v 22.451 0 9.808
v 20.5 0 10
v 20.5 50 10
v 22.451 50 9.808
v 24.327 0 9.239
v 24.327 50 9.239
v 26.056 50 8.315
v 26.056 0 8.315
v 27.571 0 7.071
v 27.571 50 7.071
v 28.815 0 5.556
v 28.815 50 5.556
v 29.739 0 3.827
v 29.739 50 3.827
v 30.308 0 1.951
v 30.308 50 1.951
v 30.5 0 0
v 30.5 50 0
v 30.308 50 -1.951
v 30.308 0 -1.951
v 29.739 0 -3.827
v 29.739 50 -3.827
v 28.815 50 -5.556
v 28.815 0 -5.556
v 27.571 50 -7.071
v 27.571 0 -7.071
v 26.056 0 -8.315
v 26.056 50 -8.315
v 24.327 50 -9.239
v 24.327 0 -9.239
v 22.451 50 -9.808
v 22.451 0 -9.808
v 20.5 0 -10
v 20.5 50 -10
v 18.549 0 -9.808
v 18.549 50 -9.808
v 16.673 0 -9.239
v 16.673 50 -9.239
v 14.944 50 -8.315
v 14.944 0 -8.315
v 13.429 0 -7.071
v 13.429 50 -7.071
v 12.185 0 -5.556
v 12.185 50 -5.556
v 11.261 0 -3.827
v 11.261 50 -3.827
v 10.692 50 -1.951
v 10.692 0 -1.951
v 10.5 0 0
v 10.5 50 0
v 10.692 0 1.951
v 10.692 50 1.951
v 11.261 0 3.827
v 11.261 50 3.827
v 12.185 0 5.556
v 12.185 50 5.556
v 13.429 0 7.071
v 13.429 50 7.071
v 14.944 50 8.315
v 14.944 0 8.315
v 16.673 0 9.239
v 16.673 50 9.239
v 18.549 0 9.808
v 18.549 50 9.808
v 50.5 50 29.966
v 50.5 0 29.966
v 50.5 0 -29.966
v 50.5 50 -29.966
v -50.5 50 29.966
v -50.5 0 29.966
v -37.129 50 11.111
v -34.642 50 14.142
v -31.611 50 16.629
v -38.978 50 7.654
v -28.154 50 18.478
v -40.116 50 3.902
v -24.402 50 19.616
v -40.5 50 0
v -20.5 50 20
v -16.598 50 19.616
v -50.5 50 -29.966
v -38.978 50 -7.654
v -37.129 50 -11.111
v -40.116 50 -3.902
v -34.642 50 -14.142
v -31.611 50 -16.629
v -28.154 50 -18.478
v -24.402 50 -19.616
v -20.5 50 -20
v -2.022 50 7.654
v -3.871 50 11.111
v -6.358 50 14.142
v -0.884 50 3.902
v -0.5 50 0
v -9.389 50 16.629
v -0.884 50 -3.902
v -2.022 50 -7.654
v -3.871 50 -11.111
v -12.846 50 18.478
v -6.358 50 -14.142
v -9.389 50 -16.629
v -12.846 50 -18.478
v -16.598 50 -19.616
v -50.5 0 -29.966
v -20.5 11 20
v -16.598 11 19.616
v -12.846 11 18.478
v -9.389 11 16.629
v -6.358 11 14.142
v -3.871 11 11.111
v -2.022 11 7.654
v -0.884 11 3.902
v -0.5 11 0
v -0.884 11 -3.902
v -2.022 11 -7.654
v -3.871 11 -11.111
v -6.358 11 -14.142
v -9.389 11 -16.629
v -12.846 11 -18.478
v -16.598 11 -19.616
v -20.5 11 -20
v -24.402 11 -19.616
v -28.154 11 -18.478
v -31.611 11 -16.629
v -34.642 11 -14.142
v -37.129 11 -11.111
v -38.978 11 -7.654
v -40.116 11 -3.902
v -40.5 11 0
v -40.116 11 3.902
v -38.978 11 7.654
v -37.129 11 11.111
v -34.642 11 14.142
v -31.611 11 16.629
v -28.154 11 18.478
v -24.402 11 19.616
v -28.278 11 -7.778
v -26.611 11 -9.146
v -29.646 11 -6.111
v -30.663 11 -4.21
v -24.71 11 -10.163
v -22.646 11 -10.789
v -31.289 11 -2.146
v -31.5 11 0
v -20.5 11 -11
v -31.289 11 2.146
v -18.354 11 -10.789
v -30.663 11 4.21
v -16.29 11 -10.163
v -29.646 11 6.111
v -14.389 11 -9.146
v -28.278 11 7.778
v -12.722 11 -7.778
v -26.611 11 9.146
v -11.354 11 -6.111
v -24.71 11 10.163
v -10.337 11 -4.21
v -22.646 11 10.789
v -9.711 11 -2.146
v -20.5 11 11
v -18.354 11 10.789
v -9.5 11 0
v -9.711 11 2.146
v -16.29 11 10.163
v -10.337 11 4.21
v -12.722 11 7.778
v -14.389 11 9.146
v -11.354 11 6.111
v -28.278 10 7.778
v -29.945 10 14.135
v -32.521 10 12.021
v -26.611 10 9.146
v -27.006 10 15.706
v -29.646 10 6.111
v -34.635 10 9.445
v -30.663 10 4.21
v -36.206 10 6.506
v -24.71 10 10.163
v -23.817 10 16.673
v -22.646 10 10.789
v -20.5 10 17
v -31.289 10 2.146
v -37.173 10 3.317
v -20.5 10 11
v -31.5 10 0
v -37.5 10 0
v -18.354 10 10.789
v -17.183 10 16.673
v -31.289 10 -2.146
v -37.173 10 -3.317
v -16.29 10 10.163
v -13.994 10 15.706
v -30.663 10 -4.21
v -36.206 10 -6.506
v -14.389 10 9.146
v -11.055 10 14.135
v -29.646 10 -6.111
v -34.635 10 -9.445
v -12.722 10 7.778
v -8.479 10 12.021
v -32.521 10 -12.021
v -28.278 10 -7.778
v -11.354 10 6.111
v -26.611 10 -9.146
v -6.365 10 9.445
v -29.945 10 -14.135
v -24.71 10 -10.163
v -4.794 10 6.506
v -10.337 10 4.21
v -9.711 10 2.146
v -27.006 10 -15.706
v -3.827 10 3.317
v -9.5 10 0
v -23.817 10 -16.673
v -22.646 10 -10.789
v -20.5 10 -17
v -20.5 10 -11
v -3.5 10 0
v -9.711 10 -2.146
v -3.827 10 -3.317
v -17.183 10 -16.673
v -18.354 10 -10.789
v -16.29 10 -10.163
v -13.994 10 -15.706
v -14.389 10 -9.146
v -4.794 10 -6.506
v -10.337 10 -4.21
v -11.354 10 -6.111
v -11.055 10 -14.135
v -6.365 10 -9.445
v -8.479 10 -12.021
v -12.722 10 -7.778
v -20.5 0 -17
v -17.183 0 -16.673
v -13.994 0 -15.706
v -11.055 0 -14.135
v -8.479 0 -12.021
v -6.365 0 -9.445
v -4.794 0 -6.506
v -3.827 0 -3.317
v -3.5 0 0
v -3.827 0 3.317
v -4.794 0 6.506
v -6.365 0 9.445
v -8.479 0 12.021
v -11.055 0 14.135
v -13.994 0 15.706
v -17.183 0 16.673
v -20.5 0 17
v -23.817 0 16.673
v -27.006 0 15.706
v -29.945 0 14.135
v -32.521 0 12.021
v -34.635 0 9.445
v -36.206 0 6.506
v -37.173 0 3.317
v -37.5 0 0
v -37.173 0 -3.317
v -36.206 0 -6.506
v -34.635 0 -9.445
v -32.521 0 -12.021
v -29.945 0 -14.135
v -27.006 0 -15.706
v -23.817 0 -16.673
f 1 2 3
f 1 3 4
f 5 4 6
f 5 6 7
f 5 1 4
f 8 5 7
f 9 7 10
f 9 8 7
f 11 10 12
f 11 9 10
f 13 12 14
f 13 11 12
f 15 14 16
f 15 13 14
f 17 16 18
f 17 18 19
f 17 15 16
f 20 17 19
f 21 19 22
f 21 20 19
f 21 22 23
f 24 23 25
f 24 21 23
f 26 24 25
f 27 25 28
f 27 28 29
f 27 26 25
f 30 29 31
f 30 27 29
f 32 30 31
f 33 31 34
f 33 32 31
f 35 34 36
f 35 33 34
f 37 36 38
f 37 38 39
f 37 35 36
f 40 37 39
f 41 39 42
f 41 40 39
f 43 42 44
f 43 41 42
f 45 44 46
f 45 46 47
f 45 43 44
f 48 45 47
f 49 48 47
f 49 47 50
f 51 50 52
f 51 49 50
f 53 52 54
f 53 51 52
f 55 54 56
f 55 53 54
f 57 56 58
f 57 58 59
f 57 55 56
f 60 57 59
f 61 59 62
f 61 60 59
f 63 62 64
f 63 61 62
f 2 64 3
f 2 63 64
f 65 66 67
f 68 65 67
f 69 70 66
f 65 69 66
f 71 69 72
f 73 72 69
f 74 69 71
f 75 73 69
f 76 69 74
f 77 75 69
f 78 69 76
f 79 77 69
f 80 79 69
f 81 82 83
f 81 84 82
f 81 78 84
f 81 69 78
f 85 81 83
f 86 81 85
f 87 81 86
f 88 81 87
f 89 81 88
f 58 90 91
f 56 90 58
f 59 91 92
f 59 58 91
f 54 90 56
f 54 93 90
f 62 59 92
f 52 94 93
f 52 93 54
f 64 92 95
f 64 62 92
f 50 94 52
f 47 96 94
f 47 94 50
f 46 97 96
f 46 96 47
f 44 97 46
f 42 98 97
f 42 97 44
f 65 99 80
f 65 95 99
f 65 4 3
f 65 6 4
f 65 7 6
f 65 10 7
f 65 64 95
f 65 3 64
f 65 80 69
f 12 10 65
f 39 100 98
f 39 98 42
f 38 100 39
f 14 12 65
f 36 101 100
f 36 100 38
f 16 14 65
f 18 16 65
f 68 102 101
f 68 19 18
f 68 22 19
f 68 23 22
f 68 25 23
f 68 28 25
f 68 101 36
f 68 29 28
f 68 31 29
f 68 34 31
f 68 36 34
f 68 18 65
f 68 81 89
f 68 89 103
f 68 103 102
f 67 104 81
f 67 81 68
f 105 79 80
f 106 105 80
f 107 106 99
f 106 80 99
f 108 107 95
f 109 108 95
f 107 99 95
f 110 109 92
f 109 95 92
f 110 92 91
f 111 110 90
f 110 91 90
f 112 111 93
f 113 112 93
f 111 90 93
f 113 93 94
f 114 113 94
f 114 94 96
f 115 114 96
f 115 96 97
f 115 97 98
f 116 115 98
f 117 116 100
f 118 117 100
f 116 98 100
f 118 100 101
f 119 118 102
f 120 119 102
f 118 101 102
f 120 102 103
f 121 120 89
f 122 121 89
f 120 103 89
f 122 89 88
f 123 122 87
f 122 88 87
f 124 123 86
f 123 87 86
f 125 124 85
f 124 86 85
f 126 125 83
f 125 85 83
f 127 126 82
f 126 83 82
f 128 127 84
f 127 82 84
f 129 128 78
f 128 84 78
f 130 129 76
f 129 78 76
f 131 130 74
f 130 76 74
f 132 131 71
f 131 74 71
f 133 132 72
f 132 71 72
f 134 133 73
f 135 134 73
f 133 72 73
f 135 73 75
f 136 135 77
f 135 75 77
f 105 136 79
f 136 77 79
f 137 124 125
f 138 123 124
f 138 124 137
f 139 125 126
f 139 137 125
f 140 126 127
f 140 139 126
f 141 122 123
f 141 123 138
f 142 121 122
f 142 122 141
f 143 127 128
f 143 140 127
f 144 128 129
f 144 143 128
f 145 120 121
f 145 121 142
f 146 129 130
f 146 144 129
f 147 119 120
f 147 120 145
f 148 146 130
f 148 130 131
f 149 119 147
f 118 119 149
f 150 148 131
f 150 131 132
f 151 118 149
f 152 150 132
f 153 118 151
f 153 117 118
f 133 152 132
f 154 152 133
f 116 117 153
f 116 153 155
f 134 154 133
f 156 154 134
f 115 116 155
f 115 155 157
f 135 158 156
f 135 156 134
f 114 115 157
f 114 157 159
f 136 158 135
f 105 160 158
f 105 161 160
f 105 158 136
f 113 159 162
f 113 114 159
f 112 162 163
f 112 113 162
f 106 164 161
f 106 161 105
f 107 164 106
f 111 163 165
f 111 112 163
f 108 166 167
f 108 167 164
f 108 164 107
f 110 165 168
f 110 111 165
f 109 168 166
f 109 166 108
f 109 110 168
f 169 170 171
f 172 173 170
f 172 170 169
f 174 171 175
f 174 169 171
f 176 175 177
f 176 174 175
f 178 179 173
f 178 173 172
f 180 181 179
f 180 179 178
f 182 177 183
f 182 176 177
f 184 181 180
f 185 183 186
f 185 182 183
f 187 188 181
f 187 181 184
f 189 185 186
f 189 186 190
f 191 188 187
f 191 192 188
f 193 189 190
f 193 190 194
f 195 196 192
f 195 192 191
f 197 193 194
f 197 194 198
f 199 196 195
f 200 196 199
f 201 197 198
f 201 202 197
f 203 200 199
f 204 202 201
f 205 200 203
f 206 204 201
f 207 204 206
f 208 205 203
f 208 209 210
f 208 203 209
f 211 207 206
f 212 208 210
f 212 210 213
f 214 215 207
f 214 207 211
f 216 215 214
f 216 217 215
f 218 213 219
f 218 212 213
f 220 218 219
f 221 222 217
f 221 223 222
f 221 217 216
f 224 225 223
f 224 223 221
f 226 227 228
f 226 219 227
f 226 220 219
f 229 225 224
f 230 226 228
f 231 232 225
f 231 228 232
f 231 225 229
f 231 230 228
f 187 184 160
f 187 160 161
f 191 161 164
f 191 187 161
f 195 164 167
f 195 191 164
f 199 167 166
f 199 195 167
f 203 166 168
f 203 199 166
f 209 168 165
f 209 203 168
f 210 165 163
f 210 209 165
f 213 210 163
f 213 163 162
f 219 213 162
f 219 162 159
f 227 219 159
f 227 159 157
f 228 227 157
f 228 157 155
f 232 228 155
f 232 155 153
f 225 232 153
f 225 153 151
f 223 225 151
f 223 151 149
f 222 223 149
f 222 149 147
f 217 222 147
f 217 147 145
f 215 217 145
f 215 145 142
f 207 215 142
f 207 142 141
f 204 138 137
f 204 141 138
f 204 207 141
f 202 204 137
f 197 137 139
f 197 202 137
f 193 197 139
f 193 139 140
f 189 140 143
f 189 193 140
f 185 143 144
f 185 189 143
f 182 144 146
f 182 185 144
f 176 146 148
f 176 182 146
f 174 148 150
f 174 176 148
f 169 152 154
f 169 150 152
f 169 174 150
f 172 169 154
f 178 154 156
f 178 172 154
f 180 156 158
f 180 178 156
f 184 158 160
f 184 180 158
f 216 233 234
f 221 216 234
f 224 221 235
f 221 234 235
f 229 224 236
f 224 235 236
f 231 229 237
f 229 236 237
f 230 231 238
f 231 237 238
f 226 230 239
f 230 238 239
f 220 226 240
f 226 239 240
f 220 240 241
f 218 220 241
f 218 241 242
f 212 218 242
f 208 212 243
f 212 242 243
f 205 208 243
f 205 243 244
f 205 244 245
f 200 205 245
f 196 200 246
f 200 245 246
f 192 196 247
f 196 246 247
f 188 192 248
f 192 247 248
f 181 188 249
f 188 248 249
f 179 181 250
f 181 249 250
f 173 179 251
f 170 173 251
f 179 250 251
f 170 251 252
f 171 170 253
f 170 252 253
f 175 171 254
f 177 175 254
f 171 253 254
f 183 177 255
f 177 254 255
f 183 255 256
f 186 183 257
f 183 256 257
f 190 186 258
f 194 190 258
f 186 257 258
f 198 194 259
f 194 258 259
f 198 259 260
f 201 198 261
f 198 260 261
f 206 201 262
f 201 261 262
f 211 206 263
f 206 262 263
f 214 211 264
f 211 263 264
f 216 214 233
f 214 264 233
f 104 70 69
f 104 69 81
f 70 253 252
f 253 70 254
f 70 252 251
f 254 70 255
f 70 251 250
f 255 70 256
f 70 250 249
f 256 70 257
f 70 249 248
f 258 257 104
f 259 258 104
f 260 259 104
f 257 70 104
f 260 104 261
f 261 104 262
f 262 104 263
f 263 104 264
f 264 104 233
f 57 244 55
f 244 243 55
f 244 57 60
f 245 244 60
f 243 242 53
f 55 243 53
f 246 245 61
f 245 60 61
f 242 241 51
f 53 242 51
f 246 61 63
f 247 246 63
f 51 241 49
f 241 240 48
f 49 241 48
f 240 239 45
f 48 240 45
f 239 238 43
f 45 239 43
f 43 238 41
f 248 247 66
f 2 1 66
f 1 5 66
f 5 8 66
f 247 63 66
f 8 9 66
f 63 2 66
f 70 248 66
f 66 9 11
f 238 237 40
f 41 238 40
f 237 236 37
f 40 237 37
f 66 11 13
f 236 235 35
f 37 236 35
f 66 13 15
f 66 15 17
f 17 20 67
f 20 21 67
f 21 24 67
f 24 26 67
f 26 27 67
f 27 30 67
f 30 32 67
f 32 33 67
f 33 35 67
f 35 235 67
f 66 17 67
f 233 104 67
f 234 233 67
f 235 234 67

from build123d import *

# Parameters (mm, degrees)
SKETCH1_W           = 101
SKETCH1_H           = 59.932047928
SKETCH1_R           = 11
SKETCH1_R_2         = 10
BOSS_EXTRUDE1_DEPTH = 50
SKETCH3_R           = 17
CUT_EXTRUDE1_DEPTH  = 10
SKETCH4_R           = 20
CUT_EXTRUDE2_DEPTH  = 39


with BuildPart() as part:
    # Sketch1 → Boss-Extrude1 (new body)
    with BuildSketch(Plane(origin=(0, 0, 0), x_dir=(1, 0, 0), z_dir=(0, 1, 0))):
        Rectangle(SKETCH1_W, SKETCH1_H)
        with Locations(Location((-20.5, 0, 0), (0, 0, 270))):
            Circle(SKETCH1_R, mode=Mode.SUBTRACT)
        with Locations(Location((20.5, 0, 0), (0, 0, 270))):
            Circle(SKETCH1_R_2, mode=Mode.SUBTRACT)
    extrude(amount=BOSS_EXTRUDE1_DEPTH)

    # Sketch3 → Cut-Extrude1 (cut)
    with BuildSketch(Plane.XZ):
        with Locations(Location((-20.5, 0, 0), (0, 0, 270))):
            Circle(SKETCH3_R)
    extrude(amount=-CUT_EXTRUDE1_DEPTH, mode=Mode.SUBTRACT)

    # Sketch4 → Cut-Extrude2 (cut)
    with BuildSketch(Plane(origin=(0, 50, 0), x_dir=(1, 0, 0), z_dir=(0, 1, 0))):
        with Locations(Location((-20.5, 0, 0), (0, 0, 270))):
            Circle(SKETCH4_R)
    extrude(amount=-CUT_EXTRUDE2_DEPTH, mode=Mode.SUBTRACT)


solid = part.part
